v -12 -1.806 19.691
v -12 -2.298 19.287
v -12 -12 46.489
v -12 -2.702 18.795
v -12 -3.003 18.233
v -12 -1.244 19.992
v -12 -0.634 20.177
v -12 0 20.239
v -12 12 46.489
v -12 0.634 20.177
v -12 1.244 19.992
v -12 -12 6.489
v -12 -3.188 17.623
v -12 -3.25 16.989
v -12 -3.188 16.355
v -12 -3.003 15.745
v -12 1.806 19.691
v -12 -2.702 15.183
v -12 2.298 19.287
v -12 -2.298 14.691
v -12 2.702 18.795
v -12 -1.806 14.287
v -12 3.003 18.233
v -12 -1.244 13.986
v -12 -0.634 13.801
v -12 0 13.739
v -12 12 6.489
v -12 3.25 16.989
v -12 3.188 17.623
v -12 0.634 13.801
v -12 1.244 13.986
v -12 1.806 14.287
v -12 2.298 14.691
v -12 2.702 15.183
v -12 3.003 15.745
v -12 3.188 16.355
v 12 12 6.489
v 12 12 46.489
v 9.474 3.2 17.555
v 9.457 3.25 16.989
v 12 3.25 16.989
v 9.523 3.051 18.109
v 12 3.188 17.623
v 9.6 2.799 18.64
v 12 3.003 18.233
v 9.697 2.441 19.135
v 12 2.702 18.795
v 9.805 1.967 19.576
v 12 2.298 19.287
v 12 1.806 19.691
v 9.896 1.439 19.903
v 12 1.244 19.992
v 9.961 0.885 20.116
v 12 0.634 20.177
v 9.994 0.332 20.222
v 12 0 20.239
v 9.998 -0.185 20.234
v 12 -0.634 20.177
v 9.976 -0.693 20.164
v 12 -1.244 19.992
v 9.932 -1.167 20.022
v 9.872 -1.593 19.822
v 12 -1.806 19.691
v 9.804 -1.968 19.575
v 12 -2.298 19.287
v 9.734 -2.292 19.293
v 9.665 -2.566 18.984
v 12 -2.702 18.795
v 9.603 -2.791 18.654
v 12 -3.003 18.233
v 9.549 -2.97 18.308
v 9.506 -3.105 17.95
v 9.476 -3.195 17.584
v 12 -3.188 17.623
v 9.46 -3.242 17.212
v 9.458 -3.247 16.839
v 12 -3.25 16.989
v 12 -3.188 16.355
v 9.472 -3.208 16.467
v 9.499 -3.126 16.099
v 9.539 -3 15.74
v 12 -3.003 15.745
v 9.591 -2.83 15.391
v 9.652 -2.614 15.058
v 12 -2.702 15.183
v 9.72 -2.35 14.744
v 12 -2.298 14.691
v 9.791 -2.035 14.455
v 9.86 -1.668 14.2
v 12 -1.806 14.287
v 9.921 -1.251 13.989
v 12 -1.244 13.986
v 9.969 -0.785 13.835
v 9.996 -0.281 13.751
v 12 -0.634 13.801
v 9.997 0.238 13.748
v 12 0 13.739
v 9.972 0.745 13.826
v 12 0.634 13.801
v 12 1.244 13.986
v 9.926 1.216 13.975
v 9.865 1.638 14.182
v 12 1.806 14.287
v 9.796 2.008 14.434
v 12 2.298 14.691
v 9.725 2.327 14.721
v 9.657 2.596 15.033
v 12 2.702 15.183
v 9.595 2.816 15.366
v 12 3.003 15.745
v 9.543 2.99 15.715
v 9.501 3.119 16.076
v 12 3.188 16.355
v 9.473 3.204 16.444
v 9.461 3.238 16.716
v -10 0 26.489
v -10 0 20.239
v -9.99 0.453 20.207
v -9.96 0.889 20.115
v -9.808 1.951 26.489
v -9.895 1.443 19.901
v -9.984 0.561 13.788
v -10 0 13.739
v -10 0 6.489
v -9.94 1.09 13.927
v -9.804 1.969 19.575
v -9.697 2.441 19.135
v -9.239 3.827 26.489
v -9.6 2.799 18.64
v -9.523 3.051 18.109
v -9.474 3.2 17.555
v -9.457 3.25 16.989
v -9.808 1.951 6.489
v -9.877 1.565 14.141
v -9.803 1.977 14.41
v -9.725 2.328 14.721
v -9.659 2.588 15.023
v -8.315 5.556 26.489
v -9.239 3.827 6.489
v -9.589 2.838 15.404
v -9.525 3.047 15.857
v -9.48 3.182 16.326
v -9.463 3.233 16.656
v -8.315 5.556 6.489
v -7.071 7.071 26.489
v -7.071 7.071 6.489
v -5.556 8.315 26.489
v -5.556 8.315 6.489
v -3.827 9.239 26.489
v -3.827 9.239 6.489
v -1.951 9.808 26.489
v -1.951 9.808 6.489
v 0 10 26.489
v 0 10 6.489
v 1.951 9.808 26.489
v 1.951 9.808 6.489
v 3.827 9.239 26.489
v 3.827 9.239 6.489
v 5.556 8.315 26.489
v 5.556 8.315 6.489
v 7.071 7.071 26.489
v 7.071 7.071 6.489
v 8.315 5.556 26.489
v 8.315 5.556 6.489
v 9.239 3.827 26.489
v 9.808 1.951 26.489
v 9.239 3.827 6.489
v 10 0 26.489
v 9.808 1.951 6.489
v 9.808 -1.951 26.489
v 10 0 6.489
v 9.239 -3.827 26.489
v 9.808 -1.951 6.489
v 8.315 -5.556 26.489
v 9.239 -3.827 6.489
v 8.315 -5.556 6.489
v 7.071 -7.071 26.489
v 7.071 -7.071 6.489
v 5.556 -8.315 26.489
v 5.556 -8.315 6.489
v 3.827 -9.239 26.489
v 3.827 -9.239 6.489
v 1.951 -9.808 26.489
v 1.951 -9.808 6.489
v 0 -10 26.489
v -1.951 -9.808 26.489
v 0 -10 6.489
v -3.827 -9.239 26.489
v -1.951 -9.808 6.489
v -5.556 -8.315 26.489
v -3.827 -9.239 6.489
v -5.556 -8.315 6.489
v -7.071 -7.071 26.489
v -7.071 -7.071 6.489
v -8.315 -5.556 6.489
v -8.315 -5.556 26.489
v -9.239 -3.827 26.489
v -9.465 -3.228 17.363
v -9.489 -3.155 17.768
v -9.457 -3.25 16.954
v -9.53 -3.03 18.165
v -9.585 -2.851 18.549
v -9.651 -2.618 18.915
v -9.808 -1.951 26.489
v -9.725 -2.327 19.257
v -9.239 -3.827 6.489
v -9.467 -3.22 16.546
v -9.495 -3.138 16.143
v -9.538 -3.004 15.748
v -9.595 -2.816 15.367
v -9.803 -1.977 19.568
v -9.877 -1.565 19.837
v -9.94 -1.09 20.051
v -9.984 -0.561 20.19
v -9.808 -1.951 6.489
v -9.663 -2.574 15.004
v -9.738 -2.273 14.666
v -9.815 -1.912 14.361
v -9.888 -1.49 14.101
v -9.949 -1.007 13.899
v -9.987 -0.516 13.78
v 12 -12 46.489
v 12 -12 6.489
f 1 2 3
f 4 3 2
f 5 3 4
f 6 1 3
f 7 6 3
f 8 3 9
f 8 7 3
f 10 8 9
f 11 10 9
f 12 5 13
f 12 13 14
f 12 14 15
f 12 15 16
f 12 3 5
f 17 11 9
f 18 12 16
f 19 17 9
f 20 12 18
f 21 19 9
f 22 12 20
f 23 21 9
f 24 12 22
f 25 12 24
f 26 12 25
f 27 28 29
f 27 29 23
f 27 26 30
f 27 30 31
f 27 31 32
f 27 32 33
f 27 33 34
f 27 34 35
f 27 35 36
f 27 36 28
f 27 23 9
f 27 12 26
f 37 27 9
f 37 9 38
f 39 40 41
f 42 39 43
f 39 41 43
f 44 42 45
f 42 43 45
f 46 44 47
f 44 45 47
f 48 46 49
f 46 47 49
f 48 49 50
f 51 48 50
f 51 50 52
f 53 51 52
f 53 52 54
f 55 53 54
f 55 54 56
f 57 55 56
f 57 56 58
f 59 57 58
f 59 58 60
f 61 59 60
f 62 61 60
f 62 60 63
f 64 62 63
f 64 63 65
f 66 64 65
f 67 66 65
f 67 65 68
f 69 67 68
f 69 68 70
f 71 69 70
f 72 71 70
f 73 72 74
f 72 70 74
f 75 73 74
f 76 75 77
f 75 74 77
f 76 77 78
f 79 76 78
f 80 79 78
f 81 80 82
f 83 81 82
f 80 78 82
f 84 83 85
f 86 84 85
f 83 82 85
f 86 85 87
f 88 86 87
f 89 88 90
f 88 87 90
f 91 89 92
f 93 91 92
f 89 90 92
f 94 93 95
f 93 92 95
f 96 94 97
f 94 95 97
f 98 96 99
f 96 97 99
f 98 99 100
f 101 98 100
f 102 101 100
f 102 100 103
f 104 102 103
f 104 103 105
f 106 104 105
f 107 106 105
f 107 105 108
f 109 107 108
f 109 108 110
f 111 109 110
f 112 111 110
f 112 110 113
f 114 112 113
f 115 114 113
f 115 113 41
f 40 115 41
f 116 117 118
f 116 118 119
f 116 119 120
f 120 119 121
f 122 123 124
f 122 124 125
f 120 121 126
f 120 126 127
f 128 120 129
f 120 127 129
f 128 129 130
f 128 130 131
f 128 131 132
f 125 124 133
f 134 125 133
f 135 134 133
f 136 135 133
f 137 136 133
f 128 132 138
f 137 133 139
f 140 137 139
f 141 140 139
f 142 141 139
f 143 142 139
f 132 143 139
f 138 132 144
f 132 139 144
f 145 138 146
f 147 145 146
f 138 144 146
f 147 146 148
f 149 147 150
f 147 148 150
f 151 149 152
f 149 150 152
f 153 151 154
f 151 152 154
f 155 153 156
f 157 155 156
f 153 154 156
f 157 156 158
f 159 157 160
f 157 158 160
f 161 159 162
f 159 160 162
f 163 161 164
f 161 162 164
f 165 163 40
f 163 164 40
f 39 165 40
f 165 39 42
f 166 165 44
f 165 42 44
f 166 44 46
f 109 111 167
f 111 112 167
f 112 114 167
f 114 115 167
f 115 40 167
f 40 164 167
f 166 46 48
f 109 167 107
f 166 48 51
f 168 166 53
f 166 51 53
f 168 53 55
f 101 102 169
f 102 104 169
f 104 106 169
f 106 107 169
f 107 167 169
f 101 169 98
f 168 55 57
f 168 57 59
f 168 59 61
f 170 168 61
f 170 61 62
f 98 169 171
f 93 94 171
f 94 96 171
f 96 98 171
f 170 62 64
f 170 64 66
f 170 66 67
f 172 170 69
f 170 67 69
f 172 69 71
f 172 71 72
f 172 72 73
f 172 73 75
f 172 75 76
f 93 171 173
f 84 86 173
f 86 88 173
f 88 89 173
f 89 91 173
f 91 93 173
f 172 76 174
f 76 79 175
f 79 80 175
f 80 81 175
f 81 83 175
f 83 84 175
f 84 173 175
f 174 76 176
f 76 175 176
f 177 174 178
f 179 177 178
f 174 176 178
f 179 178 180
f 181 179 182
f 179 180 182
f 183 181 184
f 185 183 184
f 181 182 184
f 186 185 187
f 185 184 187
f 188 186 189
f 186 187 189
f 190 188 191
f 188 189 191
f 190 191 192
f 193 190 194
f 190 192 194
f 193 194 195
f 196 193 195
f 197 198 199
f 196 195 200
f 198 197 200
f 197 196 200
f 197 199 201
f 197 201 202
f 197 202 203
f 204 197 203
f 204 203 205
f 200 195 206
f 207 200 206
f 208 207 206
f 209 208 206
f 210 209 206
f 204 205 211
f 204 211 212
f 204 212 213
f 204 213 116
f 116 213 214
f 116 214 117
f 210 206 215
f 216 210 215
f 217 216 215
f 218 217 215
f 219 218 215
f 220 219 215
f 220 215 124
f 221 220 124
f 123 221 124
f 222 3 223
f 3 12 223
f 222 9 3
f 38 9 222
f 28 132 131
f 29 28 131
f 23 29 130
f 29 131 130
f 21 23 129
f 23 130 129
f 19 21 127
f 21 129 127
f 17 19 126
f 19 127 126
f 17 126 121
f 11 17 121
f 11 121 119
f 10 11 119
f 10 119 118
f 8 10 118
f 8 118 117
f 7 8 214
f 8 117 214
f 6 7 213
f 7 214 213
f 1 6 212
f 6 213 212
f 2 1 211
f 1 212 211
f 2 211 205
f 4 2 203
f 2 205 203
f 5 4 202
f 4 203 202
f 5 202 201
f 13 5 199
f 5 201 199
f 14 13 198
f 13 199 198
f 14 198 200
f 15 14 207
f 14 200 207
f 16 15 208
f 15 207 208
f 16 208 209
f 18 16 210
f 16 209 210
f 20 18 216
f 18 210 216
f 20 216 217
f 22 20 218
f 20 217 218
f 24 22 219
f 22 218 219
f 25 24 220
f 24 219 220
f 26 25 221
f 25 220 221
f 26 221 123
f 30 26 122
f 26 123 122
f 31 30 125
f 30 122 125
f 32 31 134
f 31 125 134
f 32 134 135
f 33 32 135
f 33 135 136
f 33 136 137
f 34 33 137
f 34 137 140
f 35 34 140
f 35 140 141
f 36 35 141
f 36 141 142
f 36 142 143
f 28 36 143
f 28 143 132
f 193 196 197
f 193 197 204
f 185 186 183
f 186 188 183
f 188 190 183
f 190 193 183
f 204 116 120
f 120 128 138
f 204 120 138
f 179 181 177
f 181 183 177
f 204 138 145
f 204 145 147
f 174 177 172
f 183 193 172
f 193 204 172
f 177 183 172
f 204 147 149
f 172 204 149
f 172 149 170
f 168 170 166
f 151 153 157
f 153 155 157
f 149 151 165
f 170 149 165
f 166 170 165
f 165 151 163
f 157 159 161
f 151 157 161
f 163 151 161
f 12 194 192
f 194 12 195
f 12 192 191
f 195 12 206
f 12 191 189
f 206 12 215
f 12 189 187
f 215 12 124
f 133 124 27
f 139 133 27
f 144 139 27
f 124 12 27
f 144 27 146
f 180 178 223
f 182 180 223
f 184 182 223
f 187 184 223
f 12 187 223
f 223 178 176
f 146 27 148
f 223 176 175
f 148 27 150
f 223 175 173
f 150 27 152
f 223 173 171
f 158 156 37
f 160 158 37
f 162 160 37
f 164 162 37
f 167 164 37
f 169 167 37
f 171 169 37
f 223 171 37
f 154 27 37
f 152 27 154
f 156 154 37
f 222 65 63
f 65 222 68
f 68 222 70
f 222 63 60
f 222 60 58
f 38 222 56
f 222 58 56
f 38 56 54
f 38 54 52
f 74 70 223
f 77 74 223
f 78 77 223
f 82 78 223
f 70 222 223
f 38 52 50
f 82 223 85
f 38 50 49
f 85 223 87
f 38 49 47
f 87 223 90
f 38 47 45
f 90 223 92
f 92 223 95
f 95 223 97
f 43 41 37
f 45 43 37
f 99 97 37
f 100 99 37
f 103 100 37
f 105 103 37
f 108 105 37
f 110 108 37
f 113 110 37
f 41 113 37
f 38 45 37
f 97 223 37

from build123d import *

# Parameters (mm, degrees)
SKETCH_3_W          = 24
SKETCH_3_H          = 24
EXTRUDE_1_DEPTH     = 20
CUT_EXTRUDE_1_REACH = 28.23
SKETCH_4_R          = 10
SKETCH_6_W          = 24
SKETCH_6_H          = 24
EXTRUDE_2_DEPTH     = 20
SKETCH_8_R          = 3.25
CUT_EXTRUDE_2_DEPTH = 54.677075735


with BuildPart() as part:
    # 草图3 → 凸台-拉伸1 (new body)
    with BuildSketch(Plane.XY.offset(26.489014396)):
        Rectangle(SKETCH_3_W, SKETCH_3_H)
    extrude(amount=-EXTRUDE_1_DEPTH)

    # 草图4 → 切除-拉伸1 (cut, up to next)
    with BuildSketch(Plane(origin=(0, 0, 6.489014396), x_dir=(-1, 0, 0), z_dir=(0, 0, -1)), mode=Mode.PRIVATE) as cut_extrude_1_sk1:
        Circle(SKETCH_4_R)
    cut_extrude_1_tool1 = extrude(cut_extrude_1_sk1.sketch, amount=-CUT_EXTRUDE_1_REACH, mode=Mode.PRIVATE) & part.part
    add(cut_extrude_1_tool1.solids().sort_by_distance((0, 0, 6.489014))[0], mode=Mode.SUBTRACT)

    # 草图6 → 凸台-拉伸2 (add)
    with BuildSketch(Plane.XY.offset(26.489014396)):
        Rectangle(SKETCH_6_W, SKETCH_6_H)
    extrude(amount=EXTRUDE_2_DEPTH)

    # 草图8 → 切除-拉伸2 (cut, through all)
    with BuildSketch(Plane(origin=(12, 0, 0), x_dir=(0, 0, -1), z_dir=(1, 0, 0))):
        with Locations(Location((-16.989014396, 0, 0), (0, 0, 90))):
            Circle(SKETCH_8_R)
    extrude(amount=-CUT_EXTRUDE_2_DEPTH, mode=Mode.SUBTRACT)


solid = part.part
